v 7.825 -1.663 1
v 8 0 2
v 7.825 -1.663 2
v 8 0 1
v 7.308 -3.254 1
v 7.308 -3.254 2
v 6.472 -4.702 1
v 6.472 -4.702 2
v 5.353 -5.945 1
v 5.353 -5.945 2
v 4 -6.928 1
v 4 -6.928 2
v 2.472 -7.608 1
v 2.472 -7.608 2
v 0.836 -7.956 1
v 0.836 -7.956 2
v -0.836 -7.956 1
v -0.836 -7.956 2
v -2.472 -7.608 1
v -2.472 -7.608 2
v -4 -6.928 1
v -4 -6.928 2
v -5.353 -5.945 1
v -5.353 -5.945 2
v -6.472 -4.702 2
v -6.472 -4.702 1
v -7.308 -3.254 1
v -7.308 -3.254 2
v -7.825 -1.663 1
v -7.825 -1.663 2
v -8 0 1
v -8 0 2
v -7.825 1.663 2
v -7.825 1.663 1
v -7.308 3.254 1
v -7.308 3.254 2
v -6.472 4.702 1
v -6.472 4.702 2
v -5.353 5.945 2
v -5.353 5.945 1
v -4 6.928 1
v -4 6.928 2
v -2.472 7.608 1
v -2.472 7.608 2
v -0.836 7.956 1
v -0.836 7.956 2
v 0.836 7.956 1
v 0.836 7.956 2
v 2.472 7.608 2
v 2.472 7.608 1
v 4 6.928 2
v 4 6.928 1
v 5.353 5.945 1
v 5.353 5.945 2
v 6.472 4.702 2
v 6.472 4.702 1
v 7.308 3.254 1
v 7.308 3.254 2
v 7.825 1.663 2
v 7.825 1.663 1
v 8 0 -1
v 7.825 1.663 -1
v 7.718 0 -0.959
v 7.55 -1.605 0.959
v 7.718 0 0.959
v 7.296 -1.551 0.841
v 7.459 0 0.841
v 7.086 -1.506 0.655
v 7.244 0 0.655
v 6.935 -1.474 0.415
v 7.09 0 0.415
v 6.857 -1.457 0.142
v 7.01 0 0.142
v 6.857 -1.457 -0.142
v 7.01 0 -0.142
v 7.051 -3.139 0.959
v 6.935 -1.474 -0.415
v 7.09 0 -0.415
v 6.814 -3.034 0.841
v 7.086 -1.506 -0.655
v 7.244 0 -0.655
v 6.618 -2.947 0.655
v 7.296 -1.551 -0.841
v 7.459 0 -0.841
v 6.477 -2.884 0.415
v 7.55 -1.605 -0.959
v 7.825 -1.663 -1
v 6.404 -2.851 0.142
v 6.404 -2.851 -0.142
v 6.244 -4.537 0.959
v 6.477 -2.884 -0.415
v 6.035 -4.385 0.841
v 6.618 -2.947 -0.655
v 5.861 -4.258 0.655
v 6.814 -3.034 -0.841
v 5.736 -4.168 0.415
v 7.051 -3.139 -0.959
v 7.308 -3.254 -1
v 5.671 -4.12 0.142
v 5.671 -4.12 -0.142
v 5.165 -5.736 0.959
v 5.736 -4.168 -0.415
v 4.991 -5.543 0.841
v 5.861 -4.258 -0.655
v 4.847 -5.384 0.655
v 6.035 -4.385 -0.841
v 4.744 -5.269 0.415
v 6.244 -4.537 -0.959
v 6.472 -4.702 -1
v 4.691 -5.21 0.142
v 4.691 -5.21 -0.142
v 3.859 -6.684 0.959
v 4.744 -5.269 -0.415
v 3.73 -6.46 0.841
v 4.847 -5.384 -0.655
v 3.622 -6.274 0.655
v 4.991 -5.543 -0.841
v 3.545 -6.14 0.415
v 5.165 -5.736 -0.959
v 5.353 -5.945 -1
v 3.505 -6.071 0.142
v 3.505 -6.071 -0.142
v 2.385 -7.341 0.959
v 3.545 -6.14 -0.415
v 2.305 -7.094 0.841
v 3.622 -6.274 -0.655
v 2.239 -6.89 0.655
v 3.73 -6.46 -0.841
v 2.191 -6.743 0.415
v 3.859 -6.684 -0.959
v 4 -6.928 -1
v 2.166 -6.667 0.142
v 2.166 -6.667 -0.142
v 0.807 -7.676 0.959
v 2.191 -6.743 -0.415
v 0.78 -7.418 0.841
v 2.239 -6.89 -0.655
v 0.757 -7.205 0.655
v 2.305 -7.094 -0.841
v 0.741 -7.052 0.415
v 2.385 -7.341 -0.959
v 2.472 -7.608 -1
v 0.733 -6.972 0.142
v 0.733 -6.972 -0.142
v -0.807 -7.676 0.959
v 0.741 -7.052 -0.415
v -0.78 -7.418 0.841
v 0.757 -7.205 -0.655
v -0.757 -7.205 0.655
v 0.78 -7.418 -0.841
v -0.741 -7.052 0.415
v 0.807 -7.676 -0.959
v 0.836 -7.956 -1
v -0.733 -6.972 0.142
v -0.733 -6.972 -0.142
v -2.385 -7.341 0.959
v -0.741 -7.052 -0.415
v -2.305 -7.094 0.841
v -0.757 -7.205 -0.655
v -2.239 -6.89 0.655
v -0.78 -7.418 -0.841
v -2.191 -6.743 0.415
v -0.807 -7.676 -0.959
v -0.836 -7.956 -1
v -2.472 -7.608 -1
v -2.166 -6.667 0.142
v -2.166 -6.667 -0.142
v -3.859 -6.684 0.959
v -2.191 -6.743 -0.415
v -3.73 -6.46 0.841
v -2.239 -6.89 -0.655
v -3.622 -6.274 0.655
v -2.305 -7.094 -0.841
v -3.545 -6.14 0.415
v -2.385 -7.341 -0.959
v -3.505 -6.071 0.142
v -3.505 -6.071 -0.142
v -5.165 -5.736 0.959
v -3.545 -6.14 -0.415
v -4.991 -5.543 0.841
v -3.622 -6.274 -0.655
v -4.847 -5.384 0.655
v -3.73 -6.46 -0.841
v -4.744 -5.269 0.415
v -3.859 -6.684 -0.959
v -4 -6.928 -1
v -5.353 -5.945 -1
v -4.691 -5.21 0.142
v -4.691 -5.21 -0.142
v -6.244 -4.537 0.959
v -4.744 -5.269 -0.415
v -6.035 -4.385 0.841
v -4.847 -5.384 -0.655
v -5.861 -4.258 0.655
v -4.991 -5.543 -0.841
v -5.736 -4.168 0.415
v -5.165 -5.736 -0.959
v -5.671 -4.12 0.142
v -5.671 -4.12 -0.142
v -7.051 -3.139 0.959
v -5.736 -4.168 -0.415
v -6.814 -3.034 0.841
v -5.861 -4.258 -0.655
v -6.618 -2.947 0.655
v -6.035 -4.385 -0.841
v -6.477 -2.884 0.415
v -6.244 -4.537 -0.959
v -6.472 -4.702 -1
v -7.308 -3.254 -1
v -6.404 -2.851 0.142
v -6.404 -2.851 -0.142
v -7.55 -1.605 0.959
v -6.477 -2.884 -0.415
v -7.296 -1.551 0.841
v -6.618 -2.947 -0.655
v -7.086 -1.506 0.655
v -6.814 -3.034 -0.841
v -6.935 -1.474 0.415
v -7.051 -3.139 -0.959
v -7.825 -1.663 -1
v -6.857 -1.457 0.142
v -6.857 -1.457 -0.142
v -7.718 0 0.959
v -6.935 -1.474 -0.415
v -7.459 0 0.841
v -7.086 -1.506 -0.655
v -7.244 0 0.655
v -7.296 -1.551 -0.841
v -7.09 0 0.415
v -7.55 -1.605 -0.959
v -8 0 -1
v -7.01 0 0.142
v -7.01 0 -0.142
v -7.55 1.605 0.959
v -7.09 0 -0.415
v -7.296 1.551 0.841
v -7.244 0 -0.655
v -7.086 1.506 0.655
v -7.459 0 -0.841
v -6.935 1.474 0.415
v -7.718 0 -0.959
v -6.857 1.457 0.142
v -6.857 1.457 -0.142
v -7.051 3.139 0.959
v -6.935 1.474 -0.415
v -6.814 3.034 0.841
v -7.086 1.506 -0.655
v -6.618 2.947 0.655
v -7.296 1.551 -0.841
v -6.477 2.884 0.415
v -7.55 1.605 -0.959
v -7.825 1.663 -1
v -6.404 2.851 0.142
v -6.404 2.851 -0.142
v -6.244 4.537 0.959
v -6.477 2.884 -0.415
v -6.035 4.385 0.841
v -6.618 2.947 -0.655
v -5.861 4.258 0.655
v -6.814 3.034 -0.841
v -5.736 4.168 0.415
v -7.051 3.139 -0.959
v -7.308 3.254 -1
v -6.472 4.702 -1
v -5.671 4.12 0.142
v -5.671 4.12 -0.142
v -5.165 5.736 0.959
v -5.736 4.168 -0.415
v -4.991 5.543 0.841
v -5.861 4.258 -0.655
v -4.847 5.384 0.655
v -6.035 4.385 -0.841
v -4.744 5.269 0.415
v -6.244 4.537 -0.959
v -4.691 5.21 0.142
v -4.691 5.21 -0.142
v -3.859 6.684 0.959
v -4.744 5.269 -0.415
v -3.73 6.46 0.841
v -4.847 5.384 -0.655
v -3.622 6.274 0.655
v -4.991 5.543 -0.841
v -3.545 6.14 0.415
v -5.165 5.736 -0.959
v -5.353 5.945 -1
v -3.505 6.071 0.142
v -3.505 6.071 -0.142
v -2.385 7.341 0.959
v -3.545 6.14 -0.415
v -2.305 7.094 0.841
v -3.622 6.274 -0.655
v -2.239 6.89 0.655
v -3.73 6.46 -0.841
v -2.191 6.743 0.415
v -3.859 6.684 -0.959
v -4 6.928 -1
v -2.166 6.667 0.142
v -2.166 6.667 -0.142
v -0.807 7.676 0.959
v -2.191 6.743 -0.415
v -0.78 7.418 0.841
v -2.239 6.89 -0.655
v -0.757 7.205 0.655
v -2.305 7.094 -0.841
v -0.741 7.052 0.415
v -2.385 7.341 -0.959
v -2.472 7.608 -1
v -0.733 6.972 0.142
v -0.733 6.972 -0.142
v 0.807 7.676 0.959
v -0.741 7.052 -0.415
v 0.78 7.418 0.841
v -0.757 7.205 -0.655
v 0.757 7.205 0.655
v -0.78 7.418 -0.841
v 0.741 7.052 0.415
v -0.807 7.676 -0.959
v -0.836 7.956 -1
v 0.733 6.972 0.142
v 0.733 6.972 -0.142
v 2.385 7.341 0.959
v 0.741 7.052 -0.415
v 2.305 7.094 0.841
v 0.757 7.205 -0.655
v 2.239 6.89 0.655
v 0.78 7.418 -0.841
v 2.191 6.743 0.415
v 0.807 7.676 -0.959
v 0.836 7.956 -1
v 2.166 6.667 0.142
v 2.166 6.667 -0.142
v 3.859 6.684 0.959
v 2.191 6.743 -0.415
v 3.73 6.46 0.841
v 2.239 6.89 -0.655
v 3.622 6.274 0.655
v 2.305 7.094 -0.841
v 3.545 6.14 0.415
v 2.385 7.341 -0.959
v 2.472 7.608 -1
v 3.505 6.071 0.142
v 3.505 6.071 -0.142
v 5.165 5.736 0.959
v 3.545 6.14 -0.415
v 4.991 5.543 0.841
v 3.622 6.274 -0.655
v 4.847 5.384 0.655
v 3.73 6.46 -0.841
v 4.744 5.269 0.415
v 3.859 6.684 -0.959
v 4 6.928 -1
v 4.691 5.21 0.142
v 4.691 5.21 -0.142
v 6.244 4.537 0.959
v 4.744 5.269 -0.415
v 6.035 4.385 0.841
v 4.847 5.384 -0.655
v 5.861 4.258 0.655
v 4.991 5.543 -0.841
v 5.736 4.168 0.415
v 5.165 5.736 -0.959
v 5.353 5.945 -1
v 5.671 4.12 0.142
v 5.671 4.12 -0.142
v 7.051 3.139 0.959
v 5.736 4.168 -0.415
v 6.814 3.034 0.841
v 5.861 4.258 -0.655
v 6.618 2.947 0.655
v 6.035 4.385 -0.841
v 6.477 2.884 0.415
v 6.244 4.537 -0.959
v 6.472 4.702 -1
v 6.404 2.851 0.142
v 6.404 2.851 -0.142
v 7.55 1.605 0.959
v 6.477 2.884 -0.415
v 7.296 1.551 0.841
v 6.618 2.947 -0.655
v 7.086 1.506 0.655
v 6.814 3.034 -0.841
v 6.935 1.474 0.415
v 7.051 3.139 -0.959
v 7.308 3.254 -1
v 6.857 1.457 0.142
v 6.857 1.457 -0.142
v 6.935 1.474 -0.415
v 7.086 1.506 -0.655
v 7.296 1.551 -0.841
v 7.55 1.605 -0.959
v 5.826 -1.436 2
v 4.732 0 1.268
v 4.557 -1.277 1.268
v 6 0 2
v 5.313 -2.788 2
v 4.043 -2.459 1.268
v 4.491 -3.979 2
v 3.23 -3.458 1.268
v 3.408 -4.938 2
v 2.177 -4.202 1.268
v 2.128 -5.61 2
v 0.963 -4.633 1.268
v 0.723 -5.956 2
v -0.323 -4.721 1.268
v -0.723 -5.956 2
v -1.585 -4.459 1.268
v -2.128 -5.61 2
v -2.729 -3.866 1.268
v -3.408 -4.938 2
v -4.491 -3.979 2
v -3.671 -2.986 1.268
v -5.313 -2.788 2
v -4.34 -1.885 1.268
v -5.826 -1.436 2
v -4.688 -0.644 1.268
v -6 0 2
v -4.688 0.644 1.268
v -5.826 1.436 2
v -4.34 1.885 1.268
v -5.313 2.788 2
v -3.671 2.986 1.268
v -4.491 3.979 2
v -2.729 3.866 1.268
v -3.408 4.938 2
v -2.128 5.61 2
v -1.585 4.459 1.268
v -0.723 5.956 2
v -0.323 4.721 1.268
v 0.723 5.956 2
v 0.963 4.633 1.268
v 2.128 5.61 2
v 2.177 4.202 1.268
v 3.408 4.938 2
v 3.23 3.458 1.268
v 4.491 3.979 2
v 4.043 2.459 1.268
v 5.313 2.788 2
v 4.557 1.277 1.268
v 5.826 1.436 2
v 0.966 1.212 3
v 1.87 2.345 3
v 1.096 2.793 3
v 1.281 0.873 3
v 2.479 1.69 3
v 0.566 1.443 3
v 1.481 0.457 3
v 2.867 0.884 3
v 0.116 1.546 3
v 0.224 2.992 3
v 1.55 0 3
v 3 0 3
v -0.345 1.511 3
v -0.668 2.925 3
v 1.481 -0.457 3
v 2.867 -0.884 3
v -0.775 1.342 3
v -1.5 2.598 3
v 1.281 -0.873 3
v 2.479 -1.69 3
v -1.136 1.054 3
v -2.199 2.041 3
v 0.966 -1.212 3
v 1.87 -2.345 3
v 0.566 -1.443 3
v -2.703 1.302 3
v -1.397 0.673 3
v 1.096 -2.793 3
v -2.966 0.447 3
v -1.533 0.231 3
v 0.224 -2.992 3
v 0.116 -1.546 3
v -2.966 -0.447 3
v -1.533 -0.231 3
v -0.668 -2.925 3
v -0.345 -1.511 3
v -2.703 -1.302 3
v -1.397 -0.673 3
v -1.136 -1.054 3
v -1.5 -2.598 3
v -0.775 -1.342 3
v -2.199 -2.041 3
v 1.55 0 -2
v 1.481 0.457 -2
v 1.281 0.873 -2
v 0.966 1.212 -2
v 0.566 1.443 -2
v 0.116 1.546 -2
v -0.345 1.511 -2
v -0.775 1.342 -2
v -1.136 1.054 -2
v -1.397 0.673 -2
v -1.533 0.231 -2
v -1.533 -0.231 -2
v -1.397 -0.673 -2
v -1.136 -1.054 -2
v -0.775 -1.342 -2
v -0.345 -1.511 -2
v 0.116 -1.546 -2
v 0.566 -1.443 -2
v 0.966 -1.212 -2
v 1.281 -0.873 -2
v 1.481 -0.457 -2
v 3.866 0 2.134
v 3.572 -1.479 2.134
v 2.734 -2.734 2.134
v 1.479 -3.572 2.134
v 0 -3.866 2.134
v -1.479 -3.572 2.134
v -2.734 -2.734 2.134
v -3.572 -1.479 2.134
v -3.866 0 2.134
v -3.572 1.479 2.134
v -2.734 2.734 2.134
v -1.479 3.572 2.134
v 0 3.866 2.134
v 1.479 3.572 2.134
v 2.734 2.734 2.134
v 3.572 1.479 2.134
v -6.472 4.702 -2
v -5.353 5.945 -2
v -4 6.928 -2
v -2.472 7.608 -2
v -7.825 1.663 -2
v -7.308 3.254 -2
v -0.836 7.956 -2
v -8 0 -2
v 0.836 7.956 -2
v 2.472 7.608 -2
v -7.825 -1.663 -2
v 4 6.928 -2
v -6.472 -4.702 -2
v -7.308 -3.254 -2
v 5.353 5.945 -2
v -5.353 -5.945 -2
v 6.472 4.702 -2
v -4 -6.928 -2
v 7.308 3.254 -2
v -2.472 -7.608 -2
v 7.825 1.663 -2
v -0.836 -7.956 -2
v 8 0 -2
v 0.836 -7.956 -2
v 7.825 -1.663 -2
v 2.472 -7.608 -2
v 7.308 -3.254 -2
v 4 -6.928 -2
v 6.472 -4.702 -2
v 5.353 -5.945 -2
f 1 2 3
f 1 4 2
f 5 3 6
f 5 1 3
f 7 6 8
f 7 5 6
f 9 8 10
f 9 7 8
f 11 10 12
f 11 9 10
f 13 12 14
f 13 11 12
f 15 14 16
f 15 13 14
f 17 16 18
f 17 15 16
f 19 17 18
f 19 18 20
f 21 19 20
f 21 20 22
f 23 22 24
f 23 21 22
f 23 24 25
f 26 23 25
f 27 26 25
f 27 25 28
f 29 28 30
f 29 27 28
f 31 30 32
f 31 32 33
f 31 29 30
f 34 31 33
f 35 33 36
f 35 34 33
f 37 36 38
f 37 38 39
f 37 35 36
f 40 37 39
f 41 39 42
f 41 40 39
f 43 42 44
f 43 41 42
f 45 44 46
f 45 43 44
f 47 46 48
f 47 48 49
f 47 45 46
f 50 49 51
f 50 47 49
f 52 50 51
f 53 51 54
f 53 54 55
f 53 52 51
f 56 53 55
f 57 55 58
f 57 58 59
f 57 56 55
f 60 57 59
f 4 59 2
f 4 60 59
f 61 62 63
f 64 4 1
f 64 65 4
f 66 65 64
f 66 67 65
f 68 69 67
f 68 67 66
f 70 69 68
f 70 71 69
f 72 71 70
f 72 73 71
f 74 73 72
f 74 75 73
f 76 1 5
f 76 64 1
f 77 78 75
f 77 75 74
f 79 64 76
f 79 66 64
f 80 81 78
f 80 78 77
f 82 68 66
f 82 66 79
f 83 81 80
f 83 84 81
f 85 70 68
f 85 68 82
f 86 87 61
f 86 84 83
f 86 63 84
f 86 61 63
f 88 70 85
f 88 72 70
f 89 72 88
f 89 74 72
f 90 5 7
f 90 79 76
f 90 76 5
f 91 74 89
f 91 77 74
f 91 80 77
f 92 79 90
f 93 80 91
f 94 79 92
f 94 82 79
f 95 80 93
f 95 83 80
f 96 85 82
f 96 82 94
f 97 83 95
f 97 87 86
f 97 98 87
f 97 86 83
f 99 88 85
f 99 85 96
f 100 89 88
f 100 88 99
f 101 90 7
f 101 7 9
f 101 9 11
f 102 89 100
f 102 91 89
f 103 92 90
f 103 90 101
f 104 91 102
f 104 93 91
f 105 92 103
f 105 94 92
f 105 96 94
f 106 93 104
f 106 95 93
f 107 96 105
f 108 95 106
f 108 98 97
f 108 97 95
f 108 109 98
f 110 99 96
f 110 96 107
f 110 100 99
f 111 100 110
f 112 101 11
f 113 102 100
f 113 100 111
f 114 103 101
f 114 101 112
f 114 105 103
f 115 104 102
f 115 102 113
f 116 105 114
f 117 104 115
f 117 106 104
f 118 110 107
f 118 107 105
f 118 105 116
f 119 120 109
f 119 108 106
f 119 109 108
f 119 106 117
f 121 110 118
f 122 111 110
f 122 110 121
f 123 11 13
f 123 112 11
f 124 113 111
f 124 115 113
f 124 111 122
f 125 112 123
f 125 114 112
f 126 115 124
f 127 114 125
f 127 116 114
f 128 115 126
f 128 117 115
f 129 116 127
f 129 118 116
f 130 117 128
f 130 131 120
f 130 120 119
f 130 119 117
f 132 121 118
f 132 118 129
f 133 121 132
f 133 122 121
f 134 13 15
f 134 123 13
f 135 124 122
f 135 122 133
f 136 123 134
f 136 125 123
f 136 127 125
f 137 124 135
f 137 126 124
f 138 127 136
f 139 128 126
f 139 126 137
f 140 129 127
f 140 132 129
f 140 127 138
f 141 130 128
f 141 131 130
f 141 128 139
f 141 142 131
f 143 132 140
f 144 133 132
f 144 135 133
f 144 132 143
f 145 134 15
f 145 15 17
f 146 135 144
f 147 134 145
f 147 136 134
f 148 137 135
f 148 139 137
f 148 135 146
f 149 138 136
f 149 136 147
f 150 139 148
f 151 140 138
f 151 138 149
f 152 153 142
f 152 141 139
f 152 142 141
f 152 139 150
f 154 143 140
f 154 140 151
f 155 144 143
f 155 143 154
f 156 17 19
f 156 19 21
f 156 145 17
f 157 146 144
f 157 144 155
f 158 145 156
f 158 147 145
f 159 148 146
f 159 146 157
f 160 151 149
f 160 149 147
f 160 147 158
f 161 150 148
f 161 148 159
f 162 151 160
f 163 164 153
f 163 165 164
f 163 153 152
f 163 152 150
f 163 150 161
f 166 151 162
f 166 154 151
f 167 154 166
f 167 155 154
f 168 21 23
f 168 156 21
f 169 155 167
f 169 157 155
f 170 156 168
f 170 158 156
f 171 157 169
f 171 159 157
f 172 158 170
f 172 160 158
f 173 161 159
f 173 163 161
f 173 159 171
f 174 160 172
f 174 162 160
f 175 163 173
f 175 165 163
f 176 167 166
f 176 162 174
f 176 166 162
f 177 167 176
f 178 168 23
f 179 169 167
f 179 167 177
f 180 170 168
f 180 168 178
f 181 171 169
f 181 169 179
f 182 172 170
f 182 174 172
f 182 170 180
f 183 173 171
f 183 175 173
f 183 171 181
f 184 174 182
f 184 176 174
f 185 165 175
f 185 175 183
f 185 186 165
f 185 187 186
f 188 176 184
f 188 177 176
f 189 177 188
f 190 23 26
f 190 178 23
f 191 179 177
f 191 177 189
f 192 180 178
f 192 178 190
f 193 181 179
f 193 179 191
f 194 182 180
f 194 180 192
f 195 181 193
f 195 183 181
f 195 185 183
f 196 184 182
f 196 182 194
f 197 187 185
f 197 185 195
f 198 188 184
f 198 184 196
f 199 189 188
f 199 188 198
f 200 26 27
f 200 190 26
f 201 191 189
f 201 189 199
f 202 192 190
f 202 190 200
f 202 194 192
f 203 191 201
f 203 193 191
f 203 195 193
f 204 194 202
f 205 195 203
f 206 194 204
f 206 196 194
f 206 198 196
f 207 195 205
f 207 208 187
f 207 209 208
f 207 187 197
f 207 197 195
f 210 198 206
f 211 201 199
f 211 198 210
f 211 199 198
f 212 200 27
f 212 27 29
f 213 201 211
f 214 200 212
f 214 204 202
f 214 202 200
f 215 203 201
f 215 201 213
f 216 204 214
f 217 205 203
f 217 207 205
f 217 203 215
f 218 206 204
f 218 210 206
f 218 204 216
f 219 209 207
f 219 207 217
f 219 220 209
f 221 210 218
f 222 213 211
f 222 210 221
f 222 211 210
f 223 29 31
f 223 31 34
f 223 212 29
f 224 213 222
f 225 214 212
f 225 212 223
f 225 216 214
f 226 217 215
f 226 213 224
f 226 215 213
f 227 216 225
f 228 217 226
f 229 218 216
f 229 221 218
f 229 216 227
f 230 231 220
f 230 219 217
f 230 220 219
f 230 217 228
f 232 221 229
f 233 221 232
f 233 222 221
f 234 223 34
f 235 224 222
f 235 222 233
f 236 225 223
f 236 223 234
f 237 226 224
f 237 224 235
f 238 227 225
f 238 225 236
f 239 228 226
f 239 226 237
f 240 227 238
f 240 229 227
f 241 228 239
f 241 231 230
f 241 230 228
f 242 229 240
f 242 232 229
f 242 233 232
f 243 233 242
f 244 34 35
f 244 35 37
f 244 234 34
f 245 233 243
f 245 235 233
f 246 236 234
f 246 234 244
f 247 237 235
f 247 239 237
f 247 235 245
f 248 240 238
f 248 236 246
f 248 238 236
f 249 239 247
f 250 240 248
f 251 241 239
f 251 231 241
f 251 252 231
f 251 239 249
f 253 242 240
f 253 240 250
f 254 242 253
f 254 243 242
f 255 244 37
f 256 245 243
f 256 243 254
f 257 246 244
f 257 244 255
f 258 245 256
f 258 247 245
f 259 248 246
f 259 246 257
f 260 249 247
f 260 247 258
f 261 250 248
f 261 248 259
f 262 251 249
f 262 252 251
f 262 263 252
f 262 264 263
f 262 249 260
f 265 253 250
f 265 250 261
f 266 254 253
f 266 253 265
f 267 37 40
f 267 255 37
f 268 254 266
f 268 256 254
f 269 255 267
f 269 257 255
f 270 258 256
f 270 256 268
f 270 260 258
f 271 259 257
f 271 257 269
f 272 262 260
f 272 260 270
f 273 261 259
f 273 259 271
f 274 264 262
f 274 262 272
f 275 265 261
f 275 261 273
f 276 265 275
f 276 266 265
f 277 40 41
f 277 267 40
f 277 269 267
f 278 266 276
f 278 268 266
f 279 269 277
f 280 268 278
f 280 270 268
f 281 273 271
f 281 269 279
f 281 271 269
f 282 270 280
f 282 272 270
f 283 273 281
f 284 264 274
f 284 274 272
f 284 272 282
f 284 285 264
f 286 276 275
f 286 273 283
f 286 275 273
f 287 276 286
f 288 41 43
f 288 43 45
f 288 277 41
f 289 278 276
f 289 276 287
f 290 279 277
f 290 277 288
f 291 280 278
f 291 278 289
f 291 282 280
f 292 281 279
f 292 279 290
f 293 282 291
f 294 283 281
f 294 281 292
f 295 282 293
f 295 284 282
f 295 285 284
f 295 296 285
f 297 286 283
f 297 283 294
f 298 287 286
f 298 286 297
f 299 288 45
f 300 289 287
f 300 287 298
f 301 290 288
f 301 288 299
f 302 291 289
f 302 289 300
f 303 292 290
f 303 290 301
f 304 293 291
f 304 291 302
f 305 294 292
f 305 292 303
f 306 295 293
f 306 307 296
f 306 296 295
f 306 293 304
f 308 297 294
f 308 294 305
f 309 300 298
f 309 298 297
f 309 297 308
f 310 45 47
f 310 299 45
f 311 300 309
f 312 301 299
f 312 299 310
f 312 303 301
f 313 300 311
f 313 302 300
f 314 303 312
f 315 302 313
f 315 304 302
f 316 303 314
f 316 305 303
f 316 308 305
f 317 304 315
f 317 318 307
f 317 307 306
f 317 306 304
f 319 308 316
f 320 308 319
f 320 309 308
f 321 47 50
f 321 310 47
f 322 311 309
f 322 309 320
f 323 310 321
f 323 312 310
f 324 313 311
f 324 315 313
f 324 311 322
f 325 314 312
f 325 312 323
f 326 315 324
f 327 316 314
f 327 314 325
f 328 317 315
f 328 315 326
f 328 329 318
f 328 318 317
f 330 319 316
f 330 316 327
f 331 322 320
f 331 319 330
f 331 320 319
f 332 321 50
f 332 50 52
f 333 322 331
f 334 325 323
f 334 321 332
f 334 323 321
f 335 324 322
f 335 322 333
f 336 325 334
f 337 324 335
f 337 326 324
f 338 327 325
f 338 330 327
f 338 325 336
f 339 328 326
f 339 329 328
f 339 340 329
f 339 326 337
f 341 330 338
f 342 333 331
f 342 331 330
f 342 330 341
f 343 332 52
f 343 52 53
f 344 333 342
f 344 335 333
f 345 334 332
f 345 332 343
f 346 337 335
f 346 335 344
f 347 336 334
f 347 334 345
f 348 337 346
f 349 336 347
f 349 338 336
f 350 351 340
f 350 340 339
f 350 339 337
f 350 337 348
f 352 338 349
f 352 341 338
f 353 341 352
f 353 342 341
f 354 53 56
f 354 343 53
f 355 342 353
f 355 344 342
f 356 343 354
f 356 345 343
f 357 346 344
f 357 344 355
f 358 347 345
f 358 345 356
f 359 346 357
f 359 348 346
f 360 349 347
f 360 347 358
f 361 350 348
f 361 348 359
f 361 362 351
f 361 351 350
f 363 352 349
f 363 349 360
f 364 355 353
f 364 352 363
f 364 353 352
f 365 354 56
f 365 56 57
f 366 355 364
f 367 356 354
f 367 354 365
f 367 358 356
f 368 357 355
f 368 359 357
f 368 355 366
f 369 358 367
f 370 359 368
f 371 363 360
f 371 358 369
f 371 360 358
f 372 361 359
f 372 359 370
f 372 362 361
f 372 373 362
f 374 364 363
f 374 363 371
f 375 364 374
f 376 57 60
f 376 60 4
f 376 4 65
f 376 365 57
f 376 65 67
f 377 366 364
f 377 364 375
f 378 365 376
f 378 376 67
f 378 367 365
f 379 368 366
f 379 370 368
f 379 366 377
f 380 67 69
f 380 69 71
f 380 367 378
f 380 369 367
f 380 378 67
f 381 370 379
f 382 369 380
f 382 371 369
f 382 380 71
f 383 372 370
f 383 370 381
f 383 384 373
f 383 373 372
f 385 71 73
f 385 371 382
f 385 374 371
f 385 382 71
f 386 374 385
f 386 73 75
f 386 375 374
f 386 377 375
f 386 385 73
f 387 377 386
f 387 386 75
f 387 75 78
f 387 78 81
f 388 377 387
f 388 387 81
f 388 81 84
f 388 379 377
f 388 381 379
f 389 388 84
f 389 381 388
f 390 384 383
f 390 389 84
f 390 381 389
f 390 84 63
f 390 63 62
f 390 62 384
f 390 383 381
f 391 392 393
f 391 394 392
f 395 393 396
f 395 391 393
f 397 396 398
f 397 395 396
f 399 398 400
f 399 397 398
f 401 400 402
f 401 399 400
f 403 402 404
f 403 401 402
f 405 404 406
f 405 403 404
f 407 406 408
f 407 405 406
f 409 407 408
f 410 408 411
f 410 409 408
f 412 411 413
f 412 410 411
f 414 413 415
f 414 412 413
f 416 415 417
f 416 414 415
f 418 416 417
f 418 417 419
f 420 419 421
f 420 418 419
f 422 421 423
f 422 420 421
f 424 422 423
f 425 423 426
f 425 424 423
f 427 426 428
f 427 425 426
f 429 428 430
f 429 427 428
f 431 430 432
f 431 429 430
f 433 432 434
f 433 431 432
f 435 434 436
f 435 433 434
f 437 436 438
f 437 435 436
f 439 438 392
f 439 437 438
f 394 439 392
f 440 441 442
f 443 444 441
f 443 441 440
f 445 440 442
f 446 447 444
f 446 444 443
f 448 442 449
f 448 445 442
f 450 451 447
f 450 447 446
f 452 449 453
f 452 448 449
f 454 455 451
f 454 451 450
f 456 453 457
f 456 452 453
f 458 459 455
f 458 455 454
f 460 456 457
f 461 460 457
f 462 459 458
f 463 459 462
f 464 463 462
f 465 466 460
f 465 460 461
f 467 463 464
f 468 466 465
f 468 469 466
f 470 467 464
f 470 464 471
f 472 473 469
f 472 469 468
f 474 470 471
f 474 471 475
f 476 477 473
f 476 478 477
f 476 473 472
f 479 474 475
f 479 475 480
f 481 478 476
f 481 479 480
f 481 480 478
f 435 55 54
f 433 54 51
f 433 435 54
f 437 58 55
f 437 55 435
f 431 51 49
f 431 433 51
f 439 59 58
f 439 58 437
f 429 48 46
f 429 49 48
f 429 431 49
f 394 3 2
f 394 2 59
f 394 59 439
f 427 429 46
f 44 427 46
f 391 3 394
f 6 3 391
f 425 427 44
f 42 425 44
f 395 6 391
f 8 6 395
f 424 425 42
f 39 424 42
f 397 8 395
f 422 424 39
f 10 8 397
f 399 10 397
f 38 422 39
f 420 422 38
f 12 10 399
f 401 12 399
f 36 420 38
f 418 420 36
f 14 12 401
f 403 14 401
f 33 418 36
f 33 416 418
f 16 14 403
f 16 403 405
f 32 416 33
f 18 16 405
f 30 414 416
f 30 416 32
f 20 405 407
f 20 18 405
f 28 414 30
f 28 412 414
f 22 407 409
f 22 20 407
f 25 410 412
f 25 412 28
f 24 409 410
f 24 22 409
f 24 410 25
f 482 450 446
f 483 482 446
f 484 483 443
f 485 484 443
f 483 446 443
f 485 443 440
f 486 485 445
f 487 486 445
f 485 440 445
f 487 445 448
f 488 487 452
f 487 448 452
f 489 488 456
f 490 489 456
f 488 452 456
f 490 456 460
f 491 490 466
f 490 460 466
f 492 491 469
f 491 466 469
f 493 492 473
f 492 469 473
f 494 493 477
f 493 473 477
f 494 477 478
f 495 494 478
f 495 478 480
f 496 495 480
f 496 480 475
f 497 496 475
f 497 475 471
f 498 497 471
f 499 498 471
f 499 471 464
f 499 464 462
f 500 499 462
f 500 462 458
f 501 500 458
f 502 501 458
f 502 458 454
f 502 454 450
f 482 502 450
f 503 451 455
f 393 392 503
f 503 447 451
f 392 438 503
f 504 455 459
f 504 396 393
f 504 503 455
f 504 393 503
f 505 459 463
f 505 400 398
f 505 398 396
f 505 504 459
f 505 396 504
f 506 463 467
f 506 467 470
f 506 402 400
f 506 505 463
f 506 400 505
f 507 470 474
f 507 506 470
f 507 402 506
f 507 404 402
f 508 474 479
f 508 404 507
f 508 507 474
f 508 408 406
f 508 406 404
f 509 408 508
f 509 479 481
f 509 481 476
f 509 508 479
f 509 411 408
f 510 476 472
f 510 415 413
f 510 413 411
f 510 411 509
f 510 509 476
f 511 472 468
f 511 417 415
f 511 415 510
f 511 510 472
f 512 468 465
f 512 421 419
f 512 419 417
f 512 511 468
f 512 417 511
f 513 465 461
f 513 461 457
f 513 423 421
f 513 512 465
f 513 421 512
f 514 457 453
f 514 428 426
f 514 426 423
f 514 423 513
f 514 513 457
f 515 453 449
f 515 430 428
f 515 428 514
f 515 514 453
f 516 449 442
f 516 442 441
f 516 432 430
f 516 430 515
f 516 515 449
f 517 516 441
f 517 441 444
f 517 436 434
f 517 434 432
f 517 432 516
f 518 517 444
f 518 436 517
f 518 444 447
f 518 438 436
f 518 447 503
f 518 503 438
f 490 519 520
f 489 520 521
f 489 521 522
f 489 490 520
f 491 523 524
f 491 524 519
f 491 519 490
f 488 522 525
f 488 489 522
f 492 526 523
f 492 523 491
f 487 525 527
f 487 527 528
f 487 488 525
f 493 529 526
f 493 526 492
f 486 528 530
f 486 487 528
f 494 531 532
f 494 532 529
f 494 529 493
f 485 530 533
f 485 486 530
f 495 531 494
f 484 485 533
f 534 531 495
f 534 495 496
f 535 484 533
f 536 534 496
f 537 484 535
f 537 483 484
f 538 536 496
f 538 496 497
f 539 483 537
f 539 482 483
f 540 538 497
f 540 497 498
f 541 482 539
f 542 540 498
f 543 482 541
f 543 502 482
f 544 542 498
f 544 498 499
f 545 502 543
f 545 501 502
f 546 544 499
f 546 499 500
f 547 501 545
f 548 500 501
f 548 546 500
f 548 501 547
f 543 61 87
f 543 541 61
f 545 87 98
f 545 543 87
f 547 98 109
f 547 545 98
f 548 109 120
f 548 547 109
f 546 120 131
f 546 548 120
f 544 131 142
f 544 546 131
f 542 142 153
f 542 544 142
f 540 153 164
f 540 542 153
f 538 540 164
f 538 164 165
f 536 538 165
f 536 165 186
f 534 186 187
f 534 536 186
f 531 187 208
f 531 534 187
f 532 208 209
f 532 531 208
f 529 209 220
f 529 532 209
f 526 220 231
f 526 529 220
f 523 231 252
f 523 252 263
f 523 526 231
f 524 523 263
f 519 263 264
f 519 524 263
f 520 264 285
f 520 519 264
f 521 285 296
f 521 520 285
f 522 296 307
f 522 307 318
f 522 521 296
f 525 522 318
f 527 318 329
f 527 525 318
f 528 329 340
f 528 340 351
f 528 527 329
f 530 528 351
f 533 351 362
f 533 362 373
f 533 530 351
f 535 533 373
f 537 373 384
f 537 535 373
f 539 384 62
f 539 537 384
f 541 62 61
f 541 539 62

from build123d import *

# Parameters (mm, degrees)
SKETCH2_W          = 3
SKETCH2_H          = 1
SKETCH3_R          = 1.55
CUT_EXTRUDE1_DEPTH = 13.369316877
CHAMFER1_SIZE      = 2


with BuildPart() as part:
    # Sketch2 → Revolve1 (revolve)
    with BuildSketch(Plane(origin=(0, 0, 0), x_dir=(1, 0, 0), z_dir=(0, 1, 0))):
        with Locations((1.5, -2.5)):
            Rectangle(SKETCH2_W, SKETCH2_H)
        with BuildLine():
            Line((0, 2), (0, -2))
            Line((0, -2), (3, -2))
            Line((3, -2), (3, -1))
            Line((3, -1), (4.267949192, -1))
            Line((4.267949192, -1), (6, -2))
            Line((6, -2), (8, -2))
            Line((8, -2), (8, -1))
            ThreePointArc((8, -1), (7, 0), (8, 1))
            Line((8, 1), (8, 2))
            Line((8, 2), (0, 2))
        make_face()
    revolve(axis=Axis((0, 0, 2), (0, 0, -1)))

    # Sketch3 → Cut-Extrude1 (cut, through all)
    with BuildSketch(Plane.XY.offset(3)):
        Circle(SKETCH3_R)
    extrude(amount=-CUT_EXTRUDE1_DEPTH, mode=Mode.SUBTRACT)

    # Chamfer1
    # the kernel refuses this chamfer: 2 mm, written as the material it adds along each edge
    with BuildSketch(Plane(origin=(0, 0, 1), x_dir=(1, 0, 0), z_dir=(0, 1, 0))) as chamfer1_piece_1_section:
        Polygon((3, -CHAMFER1_SIZE), (3 + CHAMFER1_SIZE, 0), (3, 0), align=None)
    chamfer1_piece_1 = revolve(axis=Axis((0, 0, 1), (0, 0, -1)), mode=Mode.PRIVATE)
    chamfer1_piece_1 = split(chamfer1_piece_1, bisect_by=Plane(origin=(-4.002141123, 0, 3), z_dir=(0, 0, -1)), keep=Keep.TOP, mode=Mode.PRIVATE)
    add(chamfer1_piece_1)


solid = part.part
